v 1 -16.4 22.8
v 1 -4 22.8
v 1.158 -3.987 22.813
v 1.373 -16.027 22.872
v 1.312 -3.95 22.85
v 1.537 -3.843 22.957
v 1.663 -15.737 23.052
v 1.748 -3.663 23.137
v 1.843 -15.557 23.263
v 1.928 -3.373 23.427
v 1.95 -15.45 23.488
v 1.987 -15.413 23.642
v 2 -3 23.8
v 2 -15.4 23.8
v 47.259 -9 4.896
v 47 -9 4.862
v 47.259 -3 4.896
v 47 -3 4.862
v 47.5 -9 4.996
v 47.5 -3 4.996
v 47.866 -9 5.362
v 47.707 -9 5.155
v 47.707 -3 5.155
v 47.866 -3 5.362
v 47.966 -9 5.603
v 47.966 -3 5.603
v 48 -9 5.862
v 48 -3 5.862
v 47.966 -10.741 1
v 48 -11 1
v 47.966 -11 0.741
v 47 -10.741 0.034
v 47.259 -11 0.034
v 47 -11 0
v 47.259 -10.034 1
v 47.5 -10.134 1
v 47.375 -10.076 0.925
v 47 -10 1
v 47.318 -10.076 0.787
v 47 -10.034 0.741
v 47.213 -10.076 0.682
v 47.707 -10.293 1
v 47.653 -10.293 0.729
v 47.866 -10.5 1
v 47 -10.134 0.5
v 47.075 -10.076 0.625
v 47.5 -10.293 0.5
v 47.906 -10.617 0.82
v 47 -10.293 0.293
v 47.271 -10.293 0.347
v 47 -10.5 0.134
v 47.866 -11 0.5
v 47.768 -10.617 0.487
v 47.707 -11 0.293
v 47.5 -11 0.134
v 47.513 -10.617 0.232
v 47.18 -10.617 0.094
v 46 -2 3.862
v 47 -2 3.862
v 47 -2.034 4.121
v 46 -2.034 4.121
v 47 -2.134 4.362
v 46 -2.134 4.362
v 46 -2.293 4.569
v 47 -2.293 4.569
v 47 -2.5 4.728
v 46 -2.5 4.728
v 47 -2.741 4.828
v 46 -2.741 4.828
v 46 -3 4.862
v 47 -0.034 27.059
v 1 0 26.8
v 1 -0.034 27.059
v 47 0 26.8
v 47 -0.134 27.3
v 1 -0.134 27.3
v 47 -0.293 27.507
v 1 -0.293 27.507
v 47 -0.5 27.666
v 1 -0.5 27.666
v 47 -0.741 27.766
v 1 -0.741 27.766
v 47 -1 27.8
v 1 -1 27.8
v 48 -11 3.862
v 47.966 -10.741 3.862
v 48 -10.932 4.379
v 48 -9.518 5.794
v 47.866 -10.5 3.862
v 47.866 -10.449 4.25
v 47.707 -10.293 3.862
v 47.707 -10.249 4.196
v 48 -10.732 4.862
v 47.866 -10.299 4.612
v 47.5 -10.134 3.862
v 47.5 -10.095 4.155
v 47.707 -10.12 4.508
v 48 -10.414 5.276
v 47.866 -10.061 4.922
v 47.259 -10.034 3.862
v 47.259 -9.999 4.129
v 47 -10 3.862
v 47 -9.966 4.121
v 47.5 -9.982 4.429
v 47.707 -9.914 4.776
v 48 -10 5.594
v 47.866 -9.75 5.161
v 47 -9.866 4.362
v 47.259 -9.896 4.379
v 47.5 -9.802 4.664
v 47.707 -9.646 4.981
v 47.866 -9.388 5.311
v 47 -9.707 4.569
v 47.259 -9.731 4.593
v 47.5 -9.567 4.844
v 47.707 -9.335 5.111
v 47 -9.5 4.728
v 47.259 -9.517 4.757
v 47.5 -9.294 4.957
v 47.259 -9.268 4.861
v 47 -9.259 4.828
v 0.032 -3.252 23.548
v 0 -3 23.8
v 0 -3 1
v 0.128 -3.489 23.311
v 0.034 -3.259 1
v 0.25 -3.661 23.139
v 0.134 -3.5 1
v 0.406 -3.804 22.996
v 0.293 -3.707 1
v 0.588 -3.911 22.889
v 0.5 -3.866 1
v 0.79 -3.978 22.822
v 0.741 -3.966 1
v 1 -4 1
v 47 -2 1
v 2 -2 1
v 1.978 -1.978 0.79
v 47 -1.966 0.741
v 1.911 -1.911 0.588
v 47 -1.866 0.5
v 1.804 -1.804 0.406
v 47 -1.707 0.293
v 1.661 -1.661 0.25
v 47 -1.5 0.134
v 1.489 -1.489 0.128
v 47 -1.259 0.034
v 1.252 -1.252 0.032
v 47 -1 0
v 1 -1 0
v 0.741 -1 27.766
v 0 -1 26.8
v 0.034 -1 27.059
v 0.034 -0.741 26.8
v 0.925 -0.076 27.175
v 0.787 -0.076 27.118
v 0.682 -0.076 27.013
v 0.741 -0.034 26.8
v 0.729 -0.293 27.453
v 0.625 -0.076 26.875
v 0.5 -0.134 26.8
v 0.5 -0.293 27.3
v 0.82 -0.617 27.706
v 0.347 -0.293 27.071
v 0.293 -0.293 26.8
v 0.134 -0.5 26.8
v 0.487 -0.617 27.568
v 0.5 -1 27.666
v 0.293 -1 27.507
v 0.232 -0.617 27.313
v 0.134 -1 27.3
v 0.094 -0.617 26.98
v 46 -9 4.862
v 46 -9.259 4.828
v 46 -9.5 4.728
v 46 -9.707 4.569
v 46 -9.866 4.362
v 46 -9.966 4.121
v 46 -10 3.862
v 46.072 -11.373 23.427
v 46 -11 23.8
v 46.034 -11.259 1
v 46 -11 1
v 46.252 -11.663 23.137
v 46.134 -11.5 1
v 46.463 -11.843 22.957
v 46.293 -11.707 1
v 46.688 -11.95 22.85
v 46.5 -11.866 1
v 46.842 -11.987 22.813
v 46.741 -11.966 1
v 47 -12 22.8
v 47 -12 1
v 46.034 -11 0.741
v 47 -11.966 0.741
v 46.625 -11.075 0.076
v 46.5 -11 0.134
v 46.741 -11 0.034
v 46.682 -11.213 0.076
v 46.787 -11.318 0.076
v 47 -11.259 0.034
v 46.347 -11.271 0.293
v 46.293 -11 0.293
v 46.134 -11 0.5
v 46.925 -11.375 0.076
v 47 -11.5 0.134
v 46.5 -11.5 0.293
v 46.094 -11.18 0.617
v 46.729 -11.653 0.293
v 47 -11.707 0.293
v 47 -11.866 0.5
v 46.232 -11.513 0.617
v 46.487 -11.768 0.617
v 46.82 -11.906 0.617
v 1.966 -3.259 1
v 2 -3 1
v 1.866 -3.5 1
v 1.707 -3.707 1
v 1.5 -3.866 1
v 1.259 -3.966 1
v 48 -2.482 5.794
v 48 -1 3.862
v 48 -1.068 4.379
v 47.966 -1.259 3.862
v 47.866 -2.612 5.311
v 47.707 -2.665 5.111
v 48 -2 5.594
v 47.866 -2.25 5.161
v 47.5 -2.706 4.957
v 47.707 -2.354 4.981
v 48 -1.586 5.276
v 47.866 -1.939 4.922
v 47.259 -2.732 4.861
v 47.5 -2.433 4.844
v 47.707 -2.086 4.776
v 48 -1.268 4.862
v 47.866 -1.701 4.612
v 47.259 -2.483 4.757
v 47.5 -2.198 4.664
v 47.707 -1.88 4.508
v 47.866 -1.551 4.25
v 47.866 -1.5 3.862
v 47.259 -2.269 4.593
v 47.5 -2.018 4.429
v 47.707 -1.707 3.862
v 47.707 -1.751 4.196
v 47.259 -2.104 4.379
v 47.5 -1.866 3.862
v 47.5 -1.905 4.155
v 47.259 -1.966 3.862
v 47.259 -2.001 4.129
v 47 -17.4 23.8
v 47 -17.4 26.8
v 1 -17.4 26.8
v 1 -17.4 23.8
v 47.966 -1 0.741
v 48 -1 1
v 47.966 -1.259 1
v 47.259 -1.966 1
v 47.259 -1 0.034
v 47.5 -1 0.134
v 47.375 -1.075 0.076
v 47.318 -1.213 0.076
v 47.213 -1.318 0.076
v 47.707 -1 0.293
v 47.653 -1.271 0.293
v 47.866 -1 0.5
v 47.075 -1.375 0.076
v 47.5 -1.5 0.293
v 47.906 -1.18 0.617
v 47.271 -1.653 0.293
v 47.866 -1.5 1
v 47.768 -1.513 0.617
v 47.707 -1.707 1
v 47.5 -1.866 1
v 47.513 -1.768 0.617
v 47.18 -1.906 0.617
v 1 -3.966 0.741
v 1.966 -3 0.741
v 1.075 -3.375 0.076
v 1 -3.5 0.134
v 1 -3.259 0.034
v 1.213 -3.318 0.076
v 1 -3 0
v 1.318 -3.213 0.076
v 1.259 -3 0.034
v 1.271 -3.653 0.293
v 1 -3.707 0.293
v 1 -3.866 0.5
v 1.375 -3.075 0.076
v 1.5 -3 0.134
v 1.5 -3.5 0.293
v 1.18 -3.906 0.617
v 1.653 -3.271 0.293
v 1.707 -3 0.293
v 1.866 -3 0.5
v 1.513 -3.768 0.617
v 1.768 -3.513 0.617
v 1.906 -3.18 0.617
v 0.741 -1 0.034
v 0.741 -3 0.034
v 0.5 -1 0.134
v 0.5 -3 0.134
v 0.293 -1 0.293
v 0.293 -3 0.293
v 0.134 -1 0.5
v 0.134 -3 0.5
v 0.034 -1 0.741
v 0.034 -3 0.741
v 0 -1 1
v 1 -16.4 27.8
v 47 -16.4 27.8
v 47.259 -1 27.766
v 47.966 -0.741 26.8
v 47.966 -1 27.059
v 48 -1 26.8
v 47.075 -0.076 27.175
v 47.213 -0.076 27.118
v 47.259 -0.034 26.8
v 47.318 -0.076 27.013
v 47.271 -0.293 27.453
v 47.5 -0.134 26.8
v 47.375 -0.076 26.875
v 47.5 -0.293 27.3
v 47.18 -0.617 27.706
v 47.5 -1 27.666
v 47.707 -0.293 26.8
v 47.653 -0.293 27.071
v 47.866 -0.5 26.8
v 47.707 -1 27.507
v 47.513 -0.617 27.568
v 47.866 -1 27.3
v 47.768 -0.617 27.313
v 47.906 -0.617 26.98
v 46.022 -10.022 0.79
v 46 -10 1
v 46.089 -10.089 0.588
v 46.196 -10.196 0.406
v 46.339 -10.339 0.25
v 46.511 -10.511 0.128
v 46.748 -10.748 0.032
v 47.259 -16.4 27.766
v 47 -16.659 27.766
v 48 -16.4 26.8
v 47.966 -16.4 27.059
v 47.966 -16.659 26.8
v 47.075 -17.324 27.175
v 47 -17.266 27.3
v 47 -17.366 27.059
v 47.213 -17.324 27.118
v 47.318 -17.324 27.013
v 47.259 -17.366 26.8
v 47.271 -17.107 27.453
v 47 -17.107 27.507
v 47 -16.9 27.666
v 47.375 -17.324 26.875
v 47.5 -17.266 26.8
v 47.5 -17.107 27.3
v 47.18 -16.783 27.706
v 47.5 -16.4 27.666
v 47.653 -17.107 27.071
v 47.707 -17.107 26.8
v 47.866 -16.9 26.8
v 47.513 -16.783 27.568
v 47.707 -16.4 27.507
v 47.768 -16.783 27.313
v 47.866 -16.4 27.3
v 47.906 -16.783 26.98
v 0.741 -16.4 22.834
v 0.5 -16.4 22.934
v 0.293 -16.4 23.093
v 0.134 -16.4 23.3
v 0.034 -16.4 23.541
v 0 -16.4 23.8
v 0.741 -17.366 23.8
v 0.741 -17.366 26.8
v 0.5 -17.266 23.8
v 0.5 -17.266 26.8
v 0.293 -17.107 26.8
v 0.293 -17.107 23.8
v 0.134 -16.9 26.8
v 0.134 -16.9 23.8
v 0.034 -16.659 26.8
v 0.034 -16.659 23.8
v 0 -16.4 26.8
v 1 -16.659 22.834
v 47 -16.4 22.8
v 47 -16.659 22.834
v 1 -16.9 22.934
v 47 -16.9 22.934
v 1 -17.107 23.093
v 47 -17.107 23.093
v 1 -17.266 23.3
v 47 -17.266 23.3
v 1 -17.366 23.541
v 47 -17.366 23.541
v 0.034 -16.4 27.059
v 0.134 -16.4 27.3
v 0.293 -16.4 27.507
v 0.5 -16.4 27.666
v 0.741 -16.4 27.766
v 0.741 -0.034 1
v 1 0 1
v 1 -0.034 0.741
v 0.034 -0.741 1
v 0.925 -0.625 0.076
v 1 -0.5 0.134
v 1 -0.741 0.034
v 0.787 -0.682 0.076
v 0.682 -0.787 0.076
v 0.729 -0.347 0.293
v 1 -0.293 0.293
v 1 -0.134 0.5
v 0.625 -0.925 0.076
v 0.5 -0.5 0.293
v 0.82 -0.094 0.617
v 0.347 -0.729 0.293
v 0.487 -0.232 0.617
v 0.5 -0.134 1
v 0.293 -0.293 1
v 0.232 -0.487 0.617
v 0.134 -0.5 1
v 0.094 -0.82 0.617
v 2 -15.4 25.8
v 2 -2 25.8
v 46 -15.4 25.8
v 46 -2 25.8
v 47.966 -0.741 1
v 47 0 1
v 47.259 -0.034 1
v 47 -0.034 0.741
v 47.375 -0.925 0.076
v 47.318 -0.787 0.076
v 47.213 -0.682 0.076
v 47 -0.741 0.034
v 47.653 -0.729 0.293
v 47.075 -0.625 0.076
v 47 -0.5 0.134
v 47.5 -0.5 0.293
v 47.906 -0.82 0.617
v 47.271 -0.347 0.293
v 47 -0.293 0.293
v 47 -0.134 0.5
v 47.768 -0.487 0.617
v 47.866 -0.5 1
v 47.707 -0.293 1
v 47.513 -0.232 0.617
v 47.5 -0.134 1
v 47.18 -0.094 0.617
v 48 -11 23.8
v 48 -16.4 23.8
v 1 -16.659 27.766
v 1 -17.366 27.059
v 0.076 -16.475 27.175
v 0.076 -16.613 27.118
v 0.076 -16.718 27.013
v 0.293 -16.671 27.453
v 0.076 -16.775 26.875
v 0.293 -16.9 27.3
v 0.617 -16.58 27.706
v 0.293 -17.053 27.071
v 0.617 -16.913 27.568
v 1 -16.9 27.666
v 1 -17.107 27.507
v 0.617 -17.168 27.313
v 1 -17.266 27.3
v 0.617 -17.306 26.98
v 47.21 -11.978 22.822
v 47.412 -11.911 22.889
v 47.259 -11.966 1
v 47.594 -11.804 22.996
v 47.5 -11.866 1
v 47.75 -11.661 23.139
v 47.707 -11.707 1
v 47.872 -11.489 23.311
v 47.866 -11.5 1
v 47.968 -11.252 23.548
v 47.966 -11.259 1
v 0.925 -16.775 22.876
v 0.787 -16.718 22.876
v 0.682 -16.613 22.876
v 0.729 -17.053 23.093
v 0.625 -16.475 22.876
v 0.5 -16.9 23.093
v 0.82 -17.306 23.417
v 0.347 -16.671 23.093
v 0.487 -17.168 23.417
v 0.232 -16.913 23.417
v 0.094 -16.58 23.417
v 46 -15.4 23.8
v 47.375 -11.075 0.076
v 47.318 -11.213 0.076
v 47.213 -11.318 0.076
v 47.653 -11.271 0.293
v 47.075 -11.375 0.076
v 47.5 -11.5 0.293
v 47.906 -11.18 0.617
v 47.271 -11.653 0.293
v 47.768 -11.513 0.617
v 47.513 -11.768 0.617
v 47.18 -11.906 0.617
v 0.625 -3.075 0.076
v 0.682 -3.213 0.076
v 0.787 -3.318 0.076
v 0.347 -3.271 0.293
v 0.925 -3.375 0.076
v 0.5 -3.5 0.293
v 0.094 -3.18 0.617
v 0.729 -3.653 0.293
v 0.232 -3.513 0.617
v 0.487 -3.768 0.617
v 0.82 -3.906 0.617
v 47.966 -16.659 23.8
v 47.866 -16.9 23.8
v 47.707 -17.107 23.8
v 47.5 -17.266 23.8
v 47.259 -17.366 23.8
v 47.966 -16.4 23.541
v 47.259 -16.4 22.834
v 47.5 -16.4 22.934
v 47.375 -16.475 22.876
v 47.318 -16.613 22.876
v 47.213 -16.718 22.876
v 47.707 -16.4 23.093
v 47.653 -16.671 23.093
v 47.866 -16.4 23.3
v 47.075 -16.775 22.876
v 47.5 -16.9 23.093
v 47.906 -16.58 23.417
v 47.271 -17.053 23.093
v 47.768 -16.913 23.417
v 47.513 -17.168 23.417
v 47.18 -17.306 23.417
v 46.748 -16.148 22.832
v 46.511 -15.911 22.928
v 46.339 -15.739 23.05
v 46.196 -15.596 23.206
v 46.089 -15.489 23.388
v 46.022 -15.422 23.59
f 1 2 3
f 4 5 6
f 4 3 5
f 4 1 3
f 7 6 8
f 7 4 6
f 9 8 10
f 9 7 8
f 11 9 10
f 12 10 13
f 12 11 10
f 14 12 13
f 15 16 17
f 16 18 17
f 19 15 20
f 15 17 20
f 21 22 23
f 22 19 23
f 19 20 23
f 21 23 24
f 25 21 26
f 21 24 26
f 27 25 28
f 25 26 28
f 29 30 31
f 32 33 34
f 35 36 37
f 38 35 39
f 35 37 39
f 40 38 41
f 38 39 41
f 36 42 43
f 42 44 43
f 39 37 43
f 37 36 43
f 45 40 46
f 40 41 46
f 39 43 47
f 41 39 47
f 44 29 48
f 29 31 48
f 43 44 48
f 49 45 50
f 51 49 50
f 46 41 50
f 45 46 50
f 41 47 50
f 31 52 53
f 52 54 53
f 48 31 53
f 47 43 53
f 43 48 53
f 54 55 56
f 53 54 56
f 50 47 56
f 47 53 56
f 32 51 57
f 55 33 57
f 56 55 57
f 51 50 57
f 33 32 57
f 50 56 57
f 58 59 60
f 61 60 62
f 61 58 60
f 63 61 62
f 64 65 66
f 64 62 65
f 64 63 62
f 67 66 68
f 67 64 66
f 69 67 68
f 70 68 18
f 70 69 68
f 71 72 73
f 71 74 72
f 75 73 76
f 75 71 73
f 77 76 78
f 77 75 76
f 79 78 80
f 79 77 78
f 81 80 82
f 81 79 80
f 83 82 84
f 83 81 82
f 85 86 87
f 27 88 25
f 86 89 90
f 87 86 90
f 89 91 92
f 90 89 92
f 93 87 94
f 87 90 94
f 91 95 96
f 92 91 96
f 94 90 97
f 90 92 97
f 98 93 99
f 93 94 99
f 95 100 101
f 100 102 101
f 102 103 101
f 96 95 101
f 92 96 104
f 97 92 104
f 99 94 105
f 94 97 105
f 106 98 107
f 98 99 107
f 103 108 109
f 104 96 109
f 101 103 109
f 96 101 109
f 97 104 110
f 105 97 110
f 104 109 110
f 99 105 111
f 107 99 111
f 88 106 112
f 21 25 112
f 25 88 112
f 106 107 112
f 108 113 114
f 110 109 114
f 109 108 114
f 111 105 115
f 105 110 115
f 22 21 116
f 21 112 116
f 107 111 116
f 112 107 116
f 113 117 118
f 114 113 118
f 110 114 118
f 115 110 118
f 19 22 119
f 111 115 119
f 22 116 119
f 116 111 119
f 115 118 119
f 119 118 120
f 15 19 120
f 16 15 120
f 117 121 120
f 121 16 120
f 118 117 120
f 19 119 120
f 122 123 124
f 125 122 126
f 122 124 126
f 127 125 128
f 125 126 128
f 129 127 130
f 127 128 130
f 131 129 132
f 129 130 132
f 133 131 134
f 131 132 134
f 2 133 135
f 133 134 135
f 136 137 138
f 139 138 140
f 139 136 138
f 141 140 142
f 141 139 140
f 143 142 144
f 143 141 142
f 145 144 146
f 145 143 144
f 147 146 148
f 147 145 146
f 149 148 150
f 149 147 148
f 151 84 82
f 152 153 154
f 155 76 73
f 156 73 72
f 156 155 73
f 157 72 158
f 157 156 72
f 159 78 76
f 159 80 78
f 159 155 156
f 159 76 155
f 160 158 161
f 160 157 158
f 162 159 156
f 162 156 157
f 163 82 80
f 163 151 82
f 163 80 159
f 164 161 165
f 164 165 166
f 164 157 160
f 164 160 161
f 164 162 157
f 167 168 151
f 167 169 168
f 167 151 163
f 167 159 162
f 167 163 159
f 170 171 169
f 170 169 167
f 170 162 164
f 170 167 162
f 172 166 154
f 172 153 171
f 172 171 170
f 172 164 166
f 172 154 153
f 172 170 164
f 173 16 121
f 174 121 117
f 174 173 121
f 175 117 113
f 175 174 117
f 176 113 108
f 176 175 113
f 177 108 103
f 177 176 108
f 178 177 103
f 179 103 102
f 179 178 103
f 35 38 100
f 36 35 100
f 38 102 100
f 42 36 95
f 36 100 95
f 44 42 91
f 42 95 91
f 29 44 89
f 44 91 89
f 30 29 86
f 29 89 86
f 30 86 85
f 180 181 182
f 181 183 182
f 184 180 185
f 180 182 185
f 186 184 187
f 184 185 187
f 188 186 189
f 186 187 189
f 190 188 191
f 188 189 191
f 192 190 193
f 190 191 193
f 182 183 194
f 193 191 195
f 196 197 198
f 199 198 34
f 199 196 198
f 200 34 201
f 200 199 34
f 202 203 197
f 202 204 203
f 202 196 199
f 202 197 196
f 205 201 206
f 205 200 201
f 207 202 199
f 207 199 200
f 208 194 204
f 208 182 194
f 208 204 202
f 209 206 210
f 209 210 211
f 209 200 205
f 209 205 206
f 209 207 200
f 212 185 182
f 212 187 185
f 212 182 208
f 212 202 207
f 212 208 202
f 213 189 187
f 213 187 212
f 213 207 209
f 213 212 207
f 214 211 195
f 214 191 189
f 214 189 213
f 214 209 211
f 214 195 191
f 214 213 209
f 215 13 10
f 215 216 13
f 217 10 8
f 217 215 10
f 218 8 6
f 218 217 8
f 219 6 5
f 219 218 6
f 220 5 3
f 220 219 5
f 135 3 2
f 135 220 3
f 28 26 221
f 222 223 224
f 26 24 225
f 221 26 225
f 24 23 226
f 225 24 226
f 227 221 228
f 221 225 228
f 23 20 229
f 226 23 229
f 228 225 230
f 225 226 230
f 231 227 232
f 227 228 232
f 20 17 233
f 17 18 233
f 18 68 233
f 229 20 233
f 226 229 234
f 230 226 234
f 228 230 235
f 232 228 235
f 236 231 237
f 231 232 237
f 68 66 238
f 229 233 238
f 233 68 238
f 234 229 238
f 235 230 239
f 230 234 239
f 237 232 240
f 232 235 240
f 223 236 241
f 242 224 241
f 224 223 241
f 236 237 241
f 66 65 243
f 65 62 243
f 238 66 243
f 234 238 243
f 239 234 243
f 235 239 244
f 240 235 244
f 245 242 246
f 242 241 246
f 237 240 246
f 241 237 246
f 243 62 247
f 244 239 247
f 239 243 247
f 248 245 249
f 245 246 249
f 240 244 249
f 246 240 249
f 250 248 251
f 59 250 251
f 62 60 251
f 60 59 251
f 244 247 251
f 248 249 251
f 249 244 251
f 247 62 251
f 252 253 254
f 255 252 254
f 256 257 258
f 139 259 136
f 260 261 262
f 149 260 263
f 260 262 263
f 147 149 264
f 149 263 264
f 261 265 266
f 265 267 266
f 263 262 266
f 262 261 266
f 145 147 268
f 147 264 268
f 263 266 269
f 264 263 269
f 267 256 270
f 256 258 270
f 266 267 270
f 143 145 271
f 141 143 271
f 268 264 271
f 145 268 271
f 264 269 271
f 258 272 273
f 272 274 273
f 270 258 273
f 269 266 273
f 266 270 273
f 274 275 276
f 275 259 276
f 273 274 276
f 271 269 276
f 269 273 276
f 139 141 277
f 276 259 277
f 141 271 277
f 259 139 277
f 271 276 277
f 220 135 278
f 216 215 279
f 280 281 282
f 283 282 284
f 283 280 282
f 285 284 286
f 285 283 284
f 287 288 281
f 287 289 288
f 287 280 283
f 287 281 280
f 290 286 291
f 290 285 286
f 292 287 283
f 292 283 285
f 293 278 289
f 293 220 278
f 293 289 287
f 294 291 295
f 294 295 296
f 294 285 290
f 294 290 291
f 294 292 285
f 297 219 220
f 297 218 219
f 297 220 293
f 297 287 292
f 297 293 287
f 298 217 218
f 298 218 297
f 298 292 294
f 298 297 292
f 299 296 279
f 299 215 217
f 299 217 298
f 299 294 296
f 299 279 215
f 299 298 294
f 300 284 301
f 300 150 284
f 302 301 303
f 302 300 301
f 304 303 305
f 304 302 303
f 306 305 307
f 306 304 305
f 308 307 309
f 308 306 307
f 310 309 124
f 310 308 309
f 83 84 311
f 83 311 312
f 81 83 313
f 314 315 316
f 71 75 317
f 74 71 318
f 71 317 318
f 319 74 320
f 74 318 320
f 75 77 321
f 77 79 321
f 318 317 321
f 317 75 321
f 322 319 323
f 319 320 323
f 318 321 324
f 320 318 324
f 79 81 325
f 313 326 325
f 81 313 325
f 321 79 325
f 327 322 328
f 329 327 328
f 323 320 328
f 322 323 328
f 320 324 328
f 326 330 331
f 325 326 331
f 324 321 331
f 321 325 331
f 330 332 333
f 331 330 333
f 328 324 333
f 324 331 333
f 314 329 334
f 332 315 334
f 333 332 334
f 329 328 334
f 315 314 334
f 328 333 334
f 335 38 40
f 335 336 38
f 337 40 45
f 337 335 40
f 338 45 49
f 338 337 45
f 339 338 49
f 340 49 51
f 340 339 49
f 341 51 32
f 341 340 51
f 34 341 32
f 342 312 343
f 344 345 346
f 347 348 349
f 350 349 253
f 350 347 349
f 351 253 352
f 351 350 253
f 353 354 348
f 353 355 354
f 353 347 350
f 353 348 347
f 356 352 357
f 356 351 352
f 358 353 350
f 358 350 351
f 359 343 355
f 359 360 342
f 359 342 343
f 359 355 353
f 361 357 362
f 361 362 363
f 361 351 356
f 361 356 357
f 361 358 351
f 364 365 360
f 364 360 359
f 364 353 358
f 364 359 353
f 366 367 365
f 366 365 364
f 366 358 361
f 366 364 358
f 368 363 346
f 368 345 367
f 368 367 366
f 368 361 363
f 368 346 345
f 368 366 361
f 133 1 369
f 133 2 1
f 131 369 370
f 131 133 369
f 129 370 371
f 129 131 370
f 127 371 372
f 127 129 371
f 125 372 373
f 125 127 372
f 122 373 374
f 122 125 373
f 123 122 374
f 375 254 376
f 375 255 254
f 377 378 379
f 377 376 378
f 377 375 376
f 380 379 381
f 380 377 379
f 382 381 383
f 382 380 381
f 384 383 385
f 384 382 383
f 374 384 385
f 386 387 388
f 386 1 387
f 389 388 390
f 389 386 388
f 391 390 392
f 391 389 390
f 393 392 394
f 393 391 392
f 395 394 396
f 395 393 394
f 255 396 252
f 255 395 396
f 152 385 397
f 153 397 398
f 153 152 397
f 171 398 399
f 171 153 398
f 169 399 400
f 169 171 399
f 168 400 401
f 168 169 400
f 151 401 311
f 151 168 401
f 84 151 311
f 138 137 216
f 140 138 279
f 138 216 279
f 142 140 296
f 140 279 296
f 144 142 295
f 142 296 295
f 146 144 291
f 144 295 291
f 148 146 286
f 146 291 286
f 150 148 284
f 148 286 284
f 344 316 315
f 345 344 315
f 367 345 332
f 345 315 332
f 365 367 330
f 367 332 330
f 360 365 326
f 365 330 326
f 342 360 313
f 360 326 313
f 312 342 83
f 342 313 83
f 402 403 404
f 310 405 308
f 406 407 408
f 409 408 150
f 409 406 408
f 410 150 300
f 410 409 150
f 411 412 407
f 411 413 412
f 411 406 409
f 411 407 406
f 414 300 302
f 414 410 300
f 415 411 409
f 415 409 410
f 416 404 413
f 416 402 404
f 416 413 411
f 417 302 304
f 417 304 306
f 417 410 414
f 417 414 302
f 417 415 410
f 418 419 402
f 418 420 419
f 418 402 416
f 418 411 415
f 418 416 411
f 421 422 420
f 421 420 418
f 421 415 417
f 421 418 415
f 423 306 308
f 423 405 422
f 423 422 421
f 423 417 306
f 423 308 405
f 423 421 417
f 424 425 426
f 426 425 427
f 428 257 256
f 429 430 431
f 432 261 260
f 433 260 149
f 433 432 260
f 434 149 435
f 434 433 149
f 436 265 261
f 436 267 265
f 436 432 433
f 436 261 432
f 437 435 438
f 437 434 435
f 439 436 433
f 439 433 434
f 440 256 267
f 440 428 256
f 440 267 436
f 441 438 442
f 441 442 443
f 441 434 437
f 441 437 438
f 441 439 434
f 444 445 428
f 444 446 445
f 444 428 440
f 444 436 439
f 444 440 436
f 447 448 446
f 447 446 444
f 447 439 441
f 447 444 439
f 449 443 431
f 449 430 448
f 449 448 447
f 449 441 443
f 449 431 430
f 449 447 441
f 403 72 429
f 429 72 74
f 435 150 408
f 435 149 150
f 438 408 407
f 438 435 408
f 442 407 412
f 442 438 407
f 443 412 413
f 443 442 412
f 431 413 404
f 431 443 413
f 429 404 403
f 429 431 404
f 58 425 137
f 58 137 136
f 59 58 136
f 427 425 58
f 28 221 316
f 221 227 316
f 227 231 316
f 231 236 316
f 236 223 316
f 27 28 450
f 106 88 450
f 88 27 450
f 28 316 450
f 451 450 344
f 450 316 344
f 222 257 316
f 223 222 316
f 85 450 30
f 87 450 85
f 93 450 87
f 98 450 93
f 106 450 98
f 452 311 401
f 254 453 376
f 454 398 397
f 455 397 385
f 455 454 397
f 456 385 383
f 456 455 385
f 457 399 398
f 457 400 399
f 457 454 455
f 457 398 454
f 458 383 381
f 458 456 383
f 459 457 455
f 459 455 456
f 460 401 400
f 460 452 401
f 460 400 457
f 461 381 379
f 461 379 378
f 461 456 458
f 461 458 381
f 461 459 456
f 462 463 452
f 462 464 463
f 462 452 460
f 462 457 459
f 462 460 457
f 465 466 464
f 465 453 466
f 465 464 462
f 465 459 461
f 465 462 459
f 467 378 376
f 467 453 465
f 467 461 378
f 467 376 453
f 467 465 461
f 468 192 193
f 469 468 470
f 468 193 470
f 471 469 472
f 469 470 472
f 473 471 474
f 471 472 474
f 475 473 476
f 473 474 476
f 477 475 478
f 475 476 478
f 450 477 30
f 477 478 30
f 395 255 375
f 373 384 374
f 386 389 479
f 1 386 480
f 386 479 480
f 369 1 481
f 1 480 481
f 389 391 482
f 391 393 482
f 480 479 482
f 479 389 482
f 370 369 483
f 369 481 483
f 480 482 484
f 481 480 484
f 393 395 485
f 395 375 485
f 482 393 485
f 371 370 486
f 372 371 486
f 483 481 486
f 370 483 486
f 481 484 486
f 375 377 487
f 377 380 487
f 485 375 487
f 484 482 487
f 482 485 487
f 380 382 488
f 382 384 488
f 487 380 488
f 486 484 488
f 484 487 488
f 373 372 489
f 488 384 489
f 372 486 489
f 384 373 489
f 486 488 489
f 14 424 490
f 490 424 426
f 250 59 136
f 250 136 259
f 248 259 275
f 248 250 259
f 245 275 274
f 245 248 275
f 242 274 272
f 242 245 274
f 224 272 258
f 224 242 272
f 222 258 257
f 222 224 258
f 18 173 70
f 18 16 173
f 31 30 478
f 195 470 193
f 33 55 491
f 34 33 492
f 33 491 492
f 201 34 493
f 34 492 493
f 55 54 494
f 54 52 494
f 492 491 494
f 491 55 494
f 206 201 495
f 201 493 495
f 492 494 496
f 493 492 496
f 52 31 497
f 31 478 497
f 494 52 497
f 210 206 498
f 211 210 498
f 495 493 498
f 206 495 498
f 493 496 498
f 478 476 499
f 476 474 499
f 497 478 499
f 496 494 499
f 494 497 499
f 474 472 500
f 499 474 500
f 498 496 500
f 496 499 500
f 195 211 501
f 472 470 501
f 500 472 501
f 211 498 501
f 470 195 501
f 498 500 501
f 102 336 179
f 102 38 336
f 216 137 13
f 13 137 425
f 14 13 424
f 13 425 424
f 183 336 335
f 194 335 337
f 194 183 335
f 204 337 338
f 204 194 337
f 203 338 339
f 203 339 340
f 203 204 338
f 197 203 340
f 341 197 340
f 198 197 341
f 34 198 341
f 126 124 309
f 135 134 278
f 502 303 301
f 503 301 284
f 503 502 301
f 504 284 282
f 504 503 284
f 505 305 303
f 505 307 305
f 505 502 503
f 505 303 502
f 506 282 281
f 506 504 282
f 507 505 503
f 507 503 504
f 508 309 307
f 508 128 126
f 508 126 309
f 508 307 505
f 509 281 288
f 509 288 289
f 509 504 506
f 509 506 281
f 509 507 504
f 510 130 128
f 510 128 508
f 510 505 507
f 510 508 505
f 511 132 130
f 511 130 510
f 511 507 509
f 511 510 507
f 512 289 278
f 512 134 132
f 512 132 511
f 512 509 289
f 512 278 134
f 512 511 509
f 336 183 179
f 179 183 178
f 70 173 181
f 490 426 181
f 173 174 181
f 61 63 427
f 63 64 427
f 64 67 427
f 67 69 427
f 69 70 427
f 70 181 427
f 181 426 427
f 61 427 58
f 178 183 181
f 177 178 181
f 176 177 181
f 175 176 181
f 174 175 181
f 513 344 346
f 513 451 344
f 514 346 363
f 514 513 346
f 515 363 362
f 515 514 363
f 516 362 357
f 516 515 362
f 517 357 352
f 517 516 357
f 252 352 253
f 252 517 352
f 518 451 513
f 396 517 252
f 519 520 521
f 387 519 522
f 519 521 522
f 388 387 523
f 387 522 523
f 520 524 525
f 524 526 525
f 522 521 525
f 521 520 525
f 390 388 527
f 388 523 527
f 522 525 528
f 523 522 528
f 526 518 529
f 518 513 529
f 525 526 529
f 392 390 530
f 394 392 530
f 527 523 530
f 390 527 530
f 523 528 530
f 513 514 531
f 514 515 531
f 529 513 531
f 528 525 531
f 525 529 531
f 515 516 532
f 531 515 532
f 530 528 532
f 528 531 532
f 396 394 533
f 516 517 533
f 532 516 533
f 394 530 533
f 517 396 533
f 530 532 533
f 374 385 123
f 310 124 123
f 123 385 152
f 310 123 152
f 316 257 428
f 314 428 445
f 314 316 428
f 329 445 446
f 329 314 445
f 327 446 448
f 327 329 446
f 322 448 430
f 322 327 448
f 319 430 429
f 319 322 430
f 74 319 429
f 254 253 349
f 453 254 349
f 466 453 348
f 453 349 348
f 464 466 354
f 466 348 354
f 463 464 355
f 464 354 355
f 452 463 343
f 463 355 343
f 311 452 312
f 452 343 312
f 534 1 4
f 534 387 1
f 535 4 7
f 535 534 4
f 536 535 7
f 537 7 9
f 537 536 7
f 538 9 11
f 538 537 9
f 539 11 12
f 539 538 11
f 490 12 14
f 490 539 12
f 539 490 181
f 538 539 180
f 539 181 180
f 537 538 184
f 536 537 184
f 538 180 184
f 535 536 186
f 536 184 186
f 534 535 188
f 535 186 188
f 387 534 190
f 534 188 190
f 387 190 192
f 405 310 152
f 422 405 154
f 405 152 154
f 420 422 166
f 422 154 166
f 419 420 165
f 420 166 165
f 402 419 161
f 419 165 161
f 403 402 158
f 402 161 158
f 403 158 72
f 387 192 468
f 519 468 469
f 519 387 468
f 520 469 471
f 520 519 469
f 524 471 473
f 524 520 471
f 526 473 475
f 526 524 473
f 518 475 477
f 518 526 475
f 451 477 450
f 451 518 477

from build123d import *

# Parameters (mm, degrees)
F0_W     = 48
F0_H     = 27.8
F1_DEPTH = 2
F2_W     = 48
F2_H     = 2
F3_DEPTH = 15.4
F4_W     = 2
F4_H     = 10
F4_H_2   = 2
F5_DEPTH = 25.8
F7_DEPTH = 3
F8_W     = 8
F8_H     = 4.8617787947
F9_DEPTH = 2
F10_R    = 0.99999


# Not quite as in the source:
# - a fillet or chamfer is up to 0.001 mm smaller than in the source, because OpenCascade refuses the exact size


with BuildPart() as f1:
    # F0 (on Front) → F1 (new body)
    with BuildSketch(Plane.XZ):
        with Locations((24, 13.9)):
            Rectangle(F0_W, F0_H)
    extrude(amount=F1_DEPTH)

    # F2 (on face) → F3 (join)
    with BuildSketch(Plane.XZ.offset(2)):
        with Locations((24, 26.8)):
            Rectangle(F2_W, F2_H)
    extrude(amount=F3_DEPTH)

    # F4 (on face) → F5 (join)
    with BuildSketch(Plane(origin=(0, 0, 25.8), x_dir=(1, 0, 0), z_dir=(0, 0, -1))):
        with Locations((47, 7)):
            Rectangle(F4_W, F4_H)
        with Locations((1, 3)):
            Rectangle(F4_W, F4_H_2)
    extrude(amount=F5_DEPTH)

    # F6 (on face) → F7 (join)
    with BuildSketch(Plane(origin=(0, 0, 25.8), x_dir=(1, 0, 0), z_dir=(0, 0, -1))):
        Polygon((46, 15.4), (46, 12), (48, 12), (48, 17.4), (46, 17.4), (2, 17.4), (0, 17.4), (0, 4), (2, 4), (2, 15.4), align=None)
    extrude(amount=F7_DEPTH)

    # F8 (on face) → F9 (cut)
    with BuildSketch(Plane.YZ.offset(48)):
        with Locations((-6, 2.4308893974)):
            Rectangle(F8_W, F8_H)
    extrude(amount=-F9_DEPTH, mode=Mode.SUBTRACT)

    # F10 (radius 1 in the source; OpenCascade refuses exactly that, so slightly less here)
    f10_edges = [f1.edges().sort_by_distance(p)[0] for p in [
        (48, -8.7, 27.8),
        (24, -17.4, 27.8),
        (0, -8.7, 27.8),
        (24, 0, 27.8),
        (48, 0, 13.9),
        (48, -17.4, 25.3),
        (48, -14.7, 22.8),
        (48, -12, 11.4),
        (48, -11, 0),
        (48, -10, 2.430889),
        (48, -6, 4.861779),
        (48, -2, 2.430889),
        (48, -1, 0),
        (0, 0, 13.9),
        (24, 0, 0),
        (0, -17.4, 25.3),
        (24, -17.4, 22.8),
        (0, -10.7, 22.8),
        (0, -4, 11.4),
        (0, -2, 0),
        (47, -2, 4.861779),
        (47, -10, 4.861779),
        (46, -12, 11.4),
        (2, -4, 11.4),
        (2, -9.7, 22.8),
        (46, -13.7, 22.8),
        (24, -15.4, 22.8),
        (1, -4, 0),
        (25, -2, 0),
        (47, -10, 0),
        (46, -11, 0),
        (2, -3, 0),
        (47, -12, 0),
    ]]
    fillet(f10_edges, radius=F10_R)


solid = f1.part
